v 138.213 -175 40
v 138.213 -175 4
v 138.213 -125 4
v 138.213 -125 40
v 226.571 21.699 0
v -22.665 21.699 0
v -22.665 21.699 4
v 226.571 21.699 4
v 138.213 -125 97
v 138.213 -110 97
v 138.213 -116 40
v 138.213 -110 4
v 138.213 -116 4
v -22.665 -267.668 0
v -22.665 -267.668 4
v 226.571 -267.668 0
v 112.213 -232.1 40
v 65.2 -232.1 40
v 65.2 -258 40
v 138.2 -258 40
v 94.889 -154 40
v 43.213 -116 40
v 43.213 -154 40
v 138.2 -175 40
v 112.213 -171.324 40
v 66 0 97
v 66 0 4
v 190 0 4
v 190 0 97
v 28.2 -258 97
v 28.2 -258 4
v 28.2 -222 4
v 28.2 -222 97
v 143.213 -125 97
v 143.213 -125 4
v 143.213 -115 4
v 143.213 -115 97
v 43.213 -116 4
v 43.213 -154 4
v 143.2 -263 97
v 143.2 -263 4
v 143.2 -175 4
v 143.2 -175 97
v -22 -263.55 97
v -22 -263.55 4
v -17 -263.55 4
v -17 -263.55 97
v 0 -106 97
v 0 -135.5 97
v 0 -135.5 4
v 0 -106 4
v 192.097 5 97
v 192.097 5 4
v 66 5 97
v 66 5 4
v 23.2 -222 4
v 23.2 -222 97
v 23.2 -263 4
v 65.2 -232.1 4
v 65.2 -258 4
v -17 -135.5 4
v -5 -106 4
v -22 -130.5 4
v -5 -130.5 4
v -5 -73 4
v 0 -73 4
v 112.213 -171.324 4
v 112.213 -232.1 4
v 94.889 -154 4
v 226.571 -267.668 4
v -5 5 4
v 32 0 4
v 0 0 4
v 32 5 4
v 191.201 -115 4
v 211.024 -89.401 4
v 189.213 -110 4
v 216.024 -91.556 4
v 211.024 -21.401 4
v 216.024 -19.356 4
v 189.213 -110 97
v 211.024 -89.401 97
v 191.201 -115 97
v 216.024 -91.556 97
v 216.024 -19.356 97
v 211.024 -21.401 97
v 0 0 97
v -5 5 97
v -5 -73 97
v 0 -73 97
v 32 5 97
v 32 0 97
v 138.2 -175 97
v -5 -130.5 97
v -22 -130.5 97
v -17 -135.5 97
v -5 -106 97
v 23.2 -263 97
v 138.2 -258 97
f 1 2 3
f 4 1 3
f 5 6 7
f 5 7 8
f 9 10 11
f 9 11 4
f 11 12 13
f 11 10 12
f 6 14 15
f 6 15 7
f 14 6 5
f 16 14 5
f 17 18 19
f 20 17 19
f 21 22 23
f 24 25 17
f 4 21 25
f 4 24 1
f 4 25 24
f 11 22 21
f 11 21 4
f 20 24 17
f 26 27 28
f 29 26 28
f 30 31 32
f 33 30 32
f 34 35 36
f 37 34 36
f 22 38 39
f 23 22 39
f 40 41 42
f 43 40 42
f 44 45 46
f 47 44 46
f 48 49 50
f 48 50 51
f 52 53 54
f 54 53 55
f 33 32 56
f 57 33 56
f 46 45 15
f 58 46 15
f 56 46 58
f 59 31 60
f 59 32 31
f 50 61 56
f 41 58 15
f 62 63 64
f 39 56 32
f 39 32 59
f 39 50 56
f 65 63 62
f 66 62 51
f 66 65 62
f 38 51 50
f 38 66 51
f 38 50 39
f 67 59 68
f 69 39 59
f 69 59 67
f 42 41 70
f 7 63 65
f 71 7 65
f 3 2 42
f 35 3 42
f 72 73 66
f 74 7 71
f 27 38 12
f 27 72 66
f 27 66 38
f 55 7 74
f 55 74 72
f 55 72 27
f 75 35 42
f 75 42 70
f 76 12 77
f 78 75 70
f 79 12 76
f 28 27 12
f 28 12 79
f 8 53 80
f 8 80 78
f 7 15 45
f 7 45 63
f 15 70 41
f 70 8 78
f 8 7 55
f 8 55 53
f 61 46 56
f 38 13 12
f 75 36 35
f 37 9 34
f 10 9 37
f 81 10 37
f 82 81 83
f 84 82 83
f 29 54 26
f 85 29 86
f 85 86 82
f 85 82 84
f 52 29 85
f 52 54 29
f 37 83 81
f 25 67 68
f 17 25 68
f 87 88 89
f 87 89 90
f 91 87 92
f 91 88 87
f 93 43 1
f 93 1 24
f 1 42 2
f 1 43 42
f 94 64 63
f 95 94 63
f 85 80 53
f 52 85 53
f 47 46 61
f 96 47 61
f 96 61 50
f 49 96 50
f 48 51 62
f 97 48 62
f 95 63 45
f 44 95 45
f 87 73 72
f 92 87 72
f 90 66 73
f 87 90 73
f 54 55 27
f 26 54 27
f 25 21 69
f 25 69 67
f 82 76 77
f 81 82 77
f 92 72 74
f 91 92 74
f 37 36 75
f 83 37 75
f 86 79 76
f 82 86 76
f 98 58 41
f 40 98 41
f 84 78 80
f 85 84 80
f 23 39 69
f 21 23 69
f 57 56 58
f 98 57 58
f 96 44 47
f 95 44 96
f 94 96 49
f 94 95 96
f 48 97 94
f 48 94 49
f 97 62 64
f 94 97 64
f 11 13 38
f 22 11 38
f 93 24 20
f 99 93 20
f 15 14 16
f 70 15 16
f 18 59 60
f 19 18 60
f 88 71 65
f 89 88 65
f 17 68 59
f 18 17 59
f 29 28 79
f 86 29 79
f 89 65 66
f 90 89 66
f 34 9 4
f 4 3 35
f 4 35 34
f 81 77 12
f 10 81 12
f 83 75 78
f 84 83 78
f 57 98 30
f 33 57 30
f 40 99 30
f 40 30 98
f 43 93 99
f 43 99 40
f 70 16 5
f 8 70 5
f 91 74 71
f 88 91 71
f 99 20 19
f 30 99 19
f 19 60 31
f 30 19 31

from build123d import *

# Parameters (mm, degrees)
SKETCH001_W  = 249.235731
SKETCH001_H  = 289.366922
PAD_DEPTH    = 4
PAD001_DEPTH = 93
PAD002_DEPTH = 36


with BuildPart() as part:
    # Sketch001 → Pad (new body)
    with BuildSketch(Plane.XY):
        with Locations((101.953362, -122.984355)):
            Rectangle(SKETCH001_W, SKETCH001_H)
    extrude(amount=PAD_DEPTH)

    # Sketch (on Face6 of Pad) → Pad001 (join)
    with BuildSketch(Plane.XY.offset(4)):
        Polygon((-17, -135.5), (0, -135.5), (0, -106), (-5, -106), (-5, -130.5), (-22, -130.5), (-22, -263.55), (-17, -263.55), align=None)
        Polygon((0, 0), (32, 0), (32, 5), (-5, 5), (-5, -73), (0, -73), align=None)
        Polygon((66, 5), (66, 0), (190, 0), (211.023543, -21.401183), (211.023543, -89.401183), (189.213253, -110), (138.213253, -110), (138.213253, -125), (143.213253, -125), (143.213253, -115), (191.201161, -115), (216.023543, -91.5564), (216.023543, -19.356138), (192.097187, 5), align=None)
        Polygon((138.2, -257.999998), (28.2, -257.999998), (28.2, -221.999998), (23.2, -221.999998), (23.2, -262.999998), (143.2, -262.999998), (143.2, -174.999998), (138.2, -174.999998), align=None)
    extrude(amount=PAD001_DEPTH)

    # Sketch002 (on Face5 of Pad001) → Pad002 (join)
    with BuildSketch(Plane.XY.offset(4)):
        Polygon((138.213253, -116), (43.213253, -116), (43.213253, -154), (94.889137, -154), (112.213253, -171.324116), (112.213253, -232.1), (65.2, -232.1), (65.2, -258.1), (138.213253, -258.1), align=None)
    extrude(amount=PAD002_DEPTH)


solid = part.part
